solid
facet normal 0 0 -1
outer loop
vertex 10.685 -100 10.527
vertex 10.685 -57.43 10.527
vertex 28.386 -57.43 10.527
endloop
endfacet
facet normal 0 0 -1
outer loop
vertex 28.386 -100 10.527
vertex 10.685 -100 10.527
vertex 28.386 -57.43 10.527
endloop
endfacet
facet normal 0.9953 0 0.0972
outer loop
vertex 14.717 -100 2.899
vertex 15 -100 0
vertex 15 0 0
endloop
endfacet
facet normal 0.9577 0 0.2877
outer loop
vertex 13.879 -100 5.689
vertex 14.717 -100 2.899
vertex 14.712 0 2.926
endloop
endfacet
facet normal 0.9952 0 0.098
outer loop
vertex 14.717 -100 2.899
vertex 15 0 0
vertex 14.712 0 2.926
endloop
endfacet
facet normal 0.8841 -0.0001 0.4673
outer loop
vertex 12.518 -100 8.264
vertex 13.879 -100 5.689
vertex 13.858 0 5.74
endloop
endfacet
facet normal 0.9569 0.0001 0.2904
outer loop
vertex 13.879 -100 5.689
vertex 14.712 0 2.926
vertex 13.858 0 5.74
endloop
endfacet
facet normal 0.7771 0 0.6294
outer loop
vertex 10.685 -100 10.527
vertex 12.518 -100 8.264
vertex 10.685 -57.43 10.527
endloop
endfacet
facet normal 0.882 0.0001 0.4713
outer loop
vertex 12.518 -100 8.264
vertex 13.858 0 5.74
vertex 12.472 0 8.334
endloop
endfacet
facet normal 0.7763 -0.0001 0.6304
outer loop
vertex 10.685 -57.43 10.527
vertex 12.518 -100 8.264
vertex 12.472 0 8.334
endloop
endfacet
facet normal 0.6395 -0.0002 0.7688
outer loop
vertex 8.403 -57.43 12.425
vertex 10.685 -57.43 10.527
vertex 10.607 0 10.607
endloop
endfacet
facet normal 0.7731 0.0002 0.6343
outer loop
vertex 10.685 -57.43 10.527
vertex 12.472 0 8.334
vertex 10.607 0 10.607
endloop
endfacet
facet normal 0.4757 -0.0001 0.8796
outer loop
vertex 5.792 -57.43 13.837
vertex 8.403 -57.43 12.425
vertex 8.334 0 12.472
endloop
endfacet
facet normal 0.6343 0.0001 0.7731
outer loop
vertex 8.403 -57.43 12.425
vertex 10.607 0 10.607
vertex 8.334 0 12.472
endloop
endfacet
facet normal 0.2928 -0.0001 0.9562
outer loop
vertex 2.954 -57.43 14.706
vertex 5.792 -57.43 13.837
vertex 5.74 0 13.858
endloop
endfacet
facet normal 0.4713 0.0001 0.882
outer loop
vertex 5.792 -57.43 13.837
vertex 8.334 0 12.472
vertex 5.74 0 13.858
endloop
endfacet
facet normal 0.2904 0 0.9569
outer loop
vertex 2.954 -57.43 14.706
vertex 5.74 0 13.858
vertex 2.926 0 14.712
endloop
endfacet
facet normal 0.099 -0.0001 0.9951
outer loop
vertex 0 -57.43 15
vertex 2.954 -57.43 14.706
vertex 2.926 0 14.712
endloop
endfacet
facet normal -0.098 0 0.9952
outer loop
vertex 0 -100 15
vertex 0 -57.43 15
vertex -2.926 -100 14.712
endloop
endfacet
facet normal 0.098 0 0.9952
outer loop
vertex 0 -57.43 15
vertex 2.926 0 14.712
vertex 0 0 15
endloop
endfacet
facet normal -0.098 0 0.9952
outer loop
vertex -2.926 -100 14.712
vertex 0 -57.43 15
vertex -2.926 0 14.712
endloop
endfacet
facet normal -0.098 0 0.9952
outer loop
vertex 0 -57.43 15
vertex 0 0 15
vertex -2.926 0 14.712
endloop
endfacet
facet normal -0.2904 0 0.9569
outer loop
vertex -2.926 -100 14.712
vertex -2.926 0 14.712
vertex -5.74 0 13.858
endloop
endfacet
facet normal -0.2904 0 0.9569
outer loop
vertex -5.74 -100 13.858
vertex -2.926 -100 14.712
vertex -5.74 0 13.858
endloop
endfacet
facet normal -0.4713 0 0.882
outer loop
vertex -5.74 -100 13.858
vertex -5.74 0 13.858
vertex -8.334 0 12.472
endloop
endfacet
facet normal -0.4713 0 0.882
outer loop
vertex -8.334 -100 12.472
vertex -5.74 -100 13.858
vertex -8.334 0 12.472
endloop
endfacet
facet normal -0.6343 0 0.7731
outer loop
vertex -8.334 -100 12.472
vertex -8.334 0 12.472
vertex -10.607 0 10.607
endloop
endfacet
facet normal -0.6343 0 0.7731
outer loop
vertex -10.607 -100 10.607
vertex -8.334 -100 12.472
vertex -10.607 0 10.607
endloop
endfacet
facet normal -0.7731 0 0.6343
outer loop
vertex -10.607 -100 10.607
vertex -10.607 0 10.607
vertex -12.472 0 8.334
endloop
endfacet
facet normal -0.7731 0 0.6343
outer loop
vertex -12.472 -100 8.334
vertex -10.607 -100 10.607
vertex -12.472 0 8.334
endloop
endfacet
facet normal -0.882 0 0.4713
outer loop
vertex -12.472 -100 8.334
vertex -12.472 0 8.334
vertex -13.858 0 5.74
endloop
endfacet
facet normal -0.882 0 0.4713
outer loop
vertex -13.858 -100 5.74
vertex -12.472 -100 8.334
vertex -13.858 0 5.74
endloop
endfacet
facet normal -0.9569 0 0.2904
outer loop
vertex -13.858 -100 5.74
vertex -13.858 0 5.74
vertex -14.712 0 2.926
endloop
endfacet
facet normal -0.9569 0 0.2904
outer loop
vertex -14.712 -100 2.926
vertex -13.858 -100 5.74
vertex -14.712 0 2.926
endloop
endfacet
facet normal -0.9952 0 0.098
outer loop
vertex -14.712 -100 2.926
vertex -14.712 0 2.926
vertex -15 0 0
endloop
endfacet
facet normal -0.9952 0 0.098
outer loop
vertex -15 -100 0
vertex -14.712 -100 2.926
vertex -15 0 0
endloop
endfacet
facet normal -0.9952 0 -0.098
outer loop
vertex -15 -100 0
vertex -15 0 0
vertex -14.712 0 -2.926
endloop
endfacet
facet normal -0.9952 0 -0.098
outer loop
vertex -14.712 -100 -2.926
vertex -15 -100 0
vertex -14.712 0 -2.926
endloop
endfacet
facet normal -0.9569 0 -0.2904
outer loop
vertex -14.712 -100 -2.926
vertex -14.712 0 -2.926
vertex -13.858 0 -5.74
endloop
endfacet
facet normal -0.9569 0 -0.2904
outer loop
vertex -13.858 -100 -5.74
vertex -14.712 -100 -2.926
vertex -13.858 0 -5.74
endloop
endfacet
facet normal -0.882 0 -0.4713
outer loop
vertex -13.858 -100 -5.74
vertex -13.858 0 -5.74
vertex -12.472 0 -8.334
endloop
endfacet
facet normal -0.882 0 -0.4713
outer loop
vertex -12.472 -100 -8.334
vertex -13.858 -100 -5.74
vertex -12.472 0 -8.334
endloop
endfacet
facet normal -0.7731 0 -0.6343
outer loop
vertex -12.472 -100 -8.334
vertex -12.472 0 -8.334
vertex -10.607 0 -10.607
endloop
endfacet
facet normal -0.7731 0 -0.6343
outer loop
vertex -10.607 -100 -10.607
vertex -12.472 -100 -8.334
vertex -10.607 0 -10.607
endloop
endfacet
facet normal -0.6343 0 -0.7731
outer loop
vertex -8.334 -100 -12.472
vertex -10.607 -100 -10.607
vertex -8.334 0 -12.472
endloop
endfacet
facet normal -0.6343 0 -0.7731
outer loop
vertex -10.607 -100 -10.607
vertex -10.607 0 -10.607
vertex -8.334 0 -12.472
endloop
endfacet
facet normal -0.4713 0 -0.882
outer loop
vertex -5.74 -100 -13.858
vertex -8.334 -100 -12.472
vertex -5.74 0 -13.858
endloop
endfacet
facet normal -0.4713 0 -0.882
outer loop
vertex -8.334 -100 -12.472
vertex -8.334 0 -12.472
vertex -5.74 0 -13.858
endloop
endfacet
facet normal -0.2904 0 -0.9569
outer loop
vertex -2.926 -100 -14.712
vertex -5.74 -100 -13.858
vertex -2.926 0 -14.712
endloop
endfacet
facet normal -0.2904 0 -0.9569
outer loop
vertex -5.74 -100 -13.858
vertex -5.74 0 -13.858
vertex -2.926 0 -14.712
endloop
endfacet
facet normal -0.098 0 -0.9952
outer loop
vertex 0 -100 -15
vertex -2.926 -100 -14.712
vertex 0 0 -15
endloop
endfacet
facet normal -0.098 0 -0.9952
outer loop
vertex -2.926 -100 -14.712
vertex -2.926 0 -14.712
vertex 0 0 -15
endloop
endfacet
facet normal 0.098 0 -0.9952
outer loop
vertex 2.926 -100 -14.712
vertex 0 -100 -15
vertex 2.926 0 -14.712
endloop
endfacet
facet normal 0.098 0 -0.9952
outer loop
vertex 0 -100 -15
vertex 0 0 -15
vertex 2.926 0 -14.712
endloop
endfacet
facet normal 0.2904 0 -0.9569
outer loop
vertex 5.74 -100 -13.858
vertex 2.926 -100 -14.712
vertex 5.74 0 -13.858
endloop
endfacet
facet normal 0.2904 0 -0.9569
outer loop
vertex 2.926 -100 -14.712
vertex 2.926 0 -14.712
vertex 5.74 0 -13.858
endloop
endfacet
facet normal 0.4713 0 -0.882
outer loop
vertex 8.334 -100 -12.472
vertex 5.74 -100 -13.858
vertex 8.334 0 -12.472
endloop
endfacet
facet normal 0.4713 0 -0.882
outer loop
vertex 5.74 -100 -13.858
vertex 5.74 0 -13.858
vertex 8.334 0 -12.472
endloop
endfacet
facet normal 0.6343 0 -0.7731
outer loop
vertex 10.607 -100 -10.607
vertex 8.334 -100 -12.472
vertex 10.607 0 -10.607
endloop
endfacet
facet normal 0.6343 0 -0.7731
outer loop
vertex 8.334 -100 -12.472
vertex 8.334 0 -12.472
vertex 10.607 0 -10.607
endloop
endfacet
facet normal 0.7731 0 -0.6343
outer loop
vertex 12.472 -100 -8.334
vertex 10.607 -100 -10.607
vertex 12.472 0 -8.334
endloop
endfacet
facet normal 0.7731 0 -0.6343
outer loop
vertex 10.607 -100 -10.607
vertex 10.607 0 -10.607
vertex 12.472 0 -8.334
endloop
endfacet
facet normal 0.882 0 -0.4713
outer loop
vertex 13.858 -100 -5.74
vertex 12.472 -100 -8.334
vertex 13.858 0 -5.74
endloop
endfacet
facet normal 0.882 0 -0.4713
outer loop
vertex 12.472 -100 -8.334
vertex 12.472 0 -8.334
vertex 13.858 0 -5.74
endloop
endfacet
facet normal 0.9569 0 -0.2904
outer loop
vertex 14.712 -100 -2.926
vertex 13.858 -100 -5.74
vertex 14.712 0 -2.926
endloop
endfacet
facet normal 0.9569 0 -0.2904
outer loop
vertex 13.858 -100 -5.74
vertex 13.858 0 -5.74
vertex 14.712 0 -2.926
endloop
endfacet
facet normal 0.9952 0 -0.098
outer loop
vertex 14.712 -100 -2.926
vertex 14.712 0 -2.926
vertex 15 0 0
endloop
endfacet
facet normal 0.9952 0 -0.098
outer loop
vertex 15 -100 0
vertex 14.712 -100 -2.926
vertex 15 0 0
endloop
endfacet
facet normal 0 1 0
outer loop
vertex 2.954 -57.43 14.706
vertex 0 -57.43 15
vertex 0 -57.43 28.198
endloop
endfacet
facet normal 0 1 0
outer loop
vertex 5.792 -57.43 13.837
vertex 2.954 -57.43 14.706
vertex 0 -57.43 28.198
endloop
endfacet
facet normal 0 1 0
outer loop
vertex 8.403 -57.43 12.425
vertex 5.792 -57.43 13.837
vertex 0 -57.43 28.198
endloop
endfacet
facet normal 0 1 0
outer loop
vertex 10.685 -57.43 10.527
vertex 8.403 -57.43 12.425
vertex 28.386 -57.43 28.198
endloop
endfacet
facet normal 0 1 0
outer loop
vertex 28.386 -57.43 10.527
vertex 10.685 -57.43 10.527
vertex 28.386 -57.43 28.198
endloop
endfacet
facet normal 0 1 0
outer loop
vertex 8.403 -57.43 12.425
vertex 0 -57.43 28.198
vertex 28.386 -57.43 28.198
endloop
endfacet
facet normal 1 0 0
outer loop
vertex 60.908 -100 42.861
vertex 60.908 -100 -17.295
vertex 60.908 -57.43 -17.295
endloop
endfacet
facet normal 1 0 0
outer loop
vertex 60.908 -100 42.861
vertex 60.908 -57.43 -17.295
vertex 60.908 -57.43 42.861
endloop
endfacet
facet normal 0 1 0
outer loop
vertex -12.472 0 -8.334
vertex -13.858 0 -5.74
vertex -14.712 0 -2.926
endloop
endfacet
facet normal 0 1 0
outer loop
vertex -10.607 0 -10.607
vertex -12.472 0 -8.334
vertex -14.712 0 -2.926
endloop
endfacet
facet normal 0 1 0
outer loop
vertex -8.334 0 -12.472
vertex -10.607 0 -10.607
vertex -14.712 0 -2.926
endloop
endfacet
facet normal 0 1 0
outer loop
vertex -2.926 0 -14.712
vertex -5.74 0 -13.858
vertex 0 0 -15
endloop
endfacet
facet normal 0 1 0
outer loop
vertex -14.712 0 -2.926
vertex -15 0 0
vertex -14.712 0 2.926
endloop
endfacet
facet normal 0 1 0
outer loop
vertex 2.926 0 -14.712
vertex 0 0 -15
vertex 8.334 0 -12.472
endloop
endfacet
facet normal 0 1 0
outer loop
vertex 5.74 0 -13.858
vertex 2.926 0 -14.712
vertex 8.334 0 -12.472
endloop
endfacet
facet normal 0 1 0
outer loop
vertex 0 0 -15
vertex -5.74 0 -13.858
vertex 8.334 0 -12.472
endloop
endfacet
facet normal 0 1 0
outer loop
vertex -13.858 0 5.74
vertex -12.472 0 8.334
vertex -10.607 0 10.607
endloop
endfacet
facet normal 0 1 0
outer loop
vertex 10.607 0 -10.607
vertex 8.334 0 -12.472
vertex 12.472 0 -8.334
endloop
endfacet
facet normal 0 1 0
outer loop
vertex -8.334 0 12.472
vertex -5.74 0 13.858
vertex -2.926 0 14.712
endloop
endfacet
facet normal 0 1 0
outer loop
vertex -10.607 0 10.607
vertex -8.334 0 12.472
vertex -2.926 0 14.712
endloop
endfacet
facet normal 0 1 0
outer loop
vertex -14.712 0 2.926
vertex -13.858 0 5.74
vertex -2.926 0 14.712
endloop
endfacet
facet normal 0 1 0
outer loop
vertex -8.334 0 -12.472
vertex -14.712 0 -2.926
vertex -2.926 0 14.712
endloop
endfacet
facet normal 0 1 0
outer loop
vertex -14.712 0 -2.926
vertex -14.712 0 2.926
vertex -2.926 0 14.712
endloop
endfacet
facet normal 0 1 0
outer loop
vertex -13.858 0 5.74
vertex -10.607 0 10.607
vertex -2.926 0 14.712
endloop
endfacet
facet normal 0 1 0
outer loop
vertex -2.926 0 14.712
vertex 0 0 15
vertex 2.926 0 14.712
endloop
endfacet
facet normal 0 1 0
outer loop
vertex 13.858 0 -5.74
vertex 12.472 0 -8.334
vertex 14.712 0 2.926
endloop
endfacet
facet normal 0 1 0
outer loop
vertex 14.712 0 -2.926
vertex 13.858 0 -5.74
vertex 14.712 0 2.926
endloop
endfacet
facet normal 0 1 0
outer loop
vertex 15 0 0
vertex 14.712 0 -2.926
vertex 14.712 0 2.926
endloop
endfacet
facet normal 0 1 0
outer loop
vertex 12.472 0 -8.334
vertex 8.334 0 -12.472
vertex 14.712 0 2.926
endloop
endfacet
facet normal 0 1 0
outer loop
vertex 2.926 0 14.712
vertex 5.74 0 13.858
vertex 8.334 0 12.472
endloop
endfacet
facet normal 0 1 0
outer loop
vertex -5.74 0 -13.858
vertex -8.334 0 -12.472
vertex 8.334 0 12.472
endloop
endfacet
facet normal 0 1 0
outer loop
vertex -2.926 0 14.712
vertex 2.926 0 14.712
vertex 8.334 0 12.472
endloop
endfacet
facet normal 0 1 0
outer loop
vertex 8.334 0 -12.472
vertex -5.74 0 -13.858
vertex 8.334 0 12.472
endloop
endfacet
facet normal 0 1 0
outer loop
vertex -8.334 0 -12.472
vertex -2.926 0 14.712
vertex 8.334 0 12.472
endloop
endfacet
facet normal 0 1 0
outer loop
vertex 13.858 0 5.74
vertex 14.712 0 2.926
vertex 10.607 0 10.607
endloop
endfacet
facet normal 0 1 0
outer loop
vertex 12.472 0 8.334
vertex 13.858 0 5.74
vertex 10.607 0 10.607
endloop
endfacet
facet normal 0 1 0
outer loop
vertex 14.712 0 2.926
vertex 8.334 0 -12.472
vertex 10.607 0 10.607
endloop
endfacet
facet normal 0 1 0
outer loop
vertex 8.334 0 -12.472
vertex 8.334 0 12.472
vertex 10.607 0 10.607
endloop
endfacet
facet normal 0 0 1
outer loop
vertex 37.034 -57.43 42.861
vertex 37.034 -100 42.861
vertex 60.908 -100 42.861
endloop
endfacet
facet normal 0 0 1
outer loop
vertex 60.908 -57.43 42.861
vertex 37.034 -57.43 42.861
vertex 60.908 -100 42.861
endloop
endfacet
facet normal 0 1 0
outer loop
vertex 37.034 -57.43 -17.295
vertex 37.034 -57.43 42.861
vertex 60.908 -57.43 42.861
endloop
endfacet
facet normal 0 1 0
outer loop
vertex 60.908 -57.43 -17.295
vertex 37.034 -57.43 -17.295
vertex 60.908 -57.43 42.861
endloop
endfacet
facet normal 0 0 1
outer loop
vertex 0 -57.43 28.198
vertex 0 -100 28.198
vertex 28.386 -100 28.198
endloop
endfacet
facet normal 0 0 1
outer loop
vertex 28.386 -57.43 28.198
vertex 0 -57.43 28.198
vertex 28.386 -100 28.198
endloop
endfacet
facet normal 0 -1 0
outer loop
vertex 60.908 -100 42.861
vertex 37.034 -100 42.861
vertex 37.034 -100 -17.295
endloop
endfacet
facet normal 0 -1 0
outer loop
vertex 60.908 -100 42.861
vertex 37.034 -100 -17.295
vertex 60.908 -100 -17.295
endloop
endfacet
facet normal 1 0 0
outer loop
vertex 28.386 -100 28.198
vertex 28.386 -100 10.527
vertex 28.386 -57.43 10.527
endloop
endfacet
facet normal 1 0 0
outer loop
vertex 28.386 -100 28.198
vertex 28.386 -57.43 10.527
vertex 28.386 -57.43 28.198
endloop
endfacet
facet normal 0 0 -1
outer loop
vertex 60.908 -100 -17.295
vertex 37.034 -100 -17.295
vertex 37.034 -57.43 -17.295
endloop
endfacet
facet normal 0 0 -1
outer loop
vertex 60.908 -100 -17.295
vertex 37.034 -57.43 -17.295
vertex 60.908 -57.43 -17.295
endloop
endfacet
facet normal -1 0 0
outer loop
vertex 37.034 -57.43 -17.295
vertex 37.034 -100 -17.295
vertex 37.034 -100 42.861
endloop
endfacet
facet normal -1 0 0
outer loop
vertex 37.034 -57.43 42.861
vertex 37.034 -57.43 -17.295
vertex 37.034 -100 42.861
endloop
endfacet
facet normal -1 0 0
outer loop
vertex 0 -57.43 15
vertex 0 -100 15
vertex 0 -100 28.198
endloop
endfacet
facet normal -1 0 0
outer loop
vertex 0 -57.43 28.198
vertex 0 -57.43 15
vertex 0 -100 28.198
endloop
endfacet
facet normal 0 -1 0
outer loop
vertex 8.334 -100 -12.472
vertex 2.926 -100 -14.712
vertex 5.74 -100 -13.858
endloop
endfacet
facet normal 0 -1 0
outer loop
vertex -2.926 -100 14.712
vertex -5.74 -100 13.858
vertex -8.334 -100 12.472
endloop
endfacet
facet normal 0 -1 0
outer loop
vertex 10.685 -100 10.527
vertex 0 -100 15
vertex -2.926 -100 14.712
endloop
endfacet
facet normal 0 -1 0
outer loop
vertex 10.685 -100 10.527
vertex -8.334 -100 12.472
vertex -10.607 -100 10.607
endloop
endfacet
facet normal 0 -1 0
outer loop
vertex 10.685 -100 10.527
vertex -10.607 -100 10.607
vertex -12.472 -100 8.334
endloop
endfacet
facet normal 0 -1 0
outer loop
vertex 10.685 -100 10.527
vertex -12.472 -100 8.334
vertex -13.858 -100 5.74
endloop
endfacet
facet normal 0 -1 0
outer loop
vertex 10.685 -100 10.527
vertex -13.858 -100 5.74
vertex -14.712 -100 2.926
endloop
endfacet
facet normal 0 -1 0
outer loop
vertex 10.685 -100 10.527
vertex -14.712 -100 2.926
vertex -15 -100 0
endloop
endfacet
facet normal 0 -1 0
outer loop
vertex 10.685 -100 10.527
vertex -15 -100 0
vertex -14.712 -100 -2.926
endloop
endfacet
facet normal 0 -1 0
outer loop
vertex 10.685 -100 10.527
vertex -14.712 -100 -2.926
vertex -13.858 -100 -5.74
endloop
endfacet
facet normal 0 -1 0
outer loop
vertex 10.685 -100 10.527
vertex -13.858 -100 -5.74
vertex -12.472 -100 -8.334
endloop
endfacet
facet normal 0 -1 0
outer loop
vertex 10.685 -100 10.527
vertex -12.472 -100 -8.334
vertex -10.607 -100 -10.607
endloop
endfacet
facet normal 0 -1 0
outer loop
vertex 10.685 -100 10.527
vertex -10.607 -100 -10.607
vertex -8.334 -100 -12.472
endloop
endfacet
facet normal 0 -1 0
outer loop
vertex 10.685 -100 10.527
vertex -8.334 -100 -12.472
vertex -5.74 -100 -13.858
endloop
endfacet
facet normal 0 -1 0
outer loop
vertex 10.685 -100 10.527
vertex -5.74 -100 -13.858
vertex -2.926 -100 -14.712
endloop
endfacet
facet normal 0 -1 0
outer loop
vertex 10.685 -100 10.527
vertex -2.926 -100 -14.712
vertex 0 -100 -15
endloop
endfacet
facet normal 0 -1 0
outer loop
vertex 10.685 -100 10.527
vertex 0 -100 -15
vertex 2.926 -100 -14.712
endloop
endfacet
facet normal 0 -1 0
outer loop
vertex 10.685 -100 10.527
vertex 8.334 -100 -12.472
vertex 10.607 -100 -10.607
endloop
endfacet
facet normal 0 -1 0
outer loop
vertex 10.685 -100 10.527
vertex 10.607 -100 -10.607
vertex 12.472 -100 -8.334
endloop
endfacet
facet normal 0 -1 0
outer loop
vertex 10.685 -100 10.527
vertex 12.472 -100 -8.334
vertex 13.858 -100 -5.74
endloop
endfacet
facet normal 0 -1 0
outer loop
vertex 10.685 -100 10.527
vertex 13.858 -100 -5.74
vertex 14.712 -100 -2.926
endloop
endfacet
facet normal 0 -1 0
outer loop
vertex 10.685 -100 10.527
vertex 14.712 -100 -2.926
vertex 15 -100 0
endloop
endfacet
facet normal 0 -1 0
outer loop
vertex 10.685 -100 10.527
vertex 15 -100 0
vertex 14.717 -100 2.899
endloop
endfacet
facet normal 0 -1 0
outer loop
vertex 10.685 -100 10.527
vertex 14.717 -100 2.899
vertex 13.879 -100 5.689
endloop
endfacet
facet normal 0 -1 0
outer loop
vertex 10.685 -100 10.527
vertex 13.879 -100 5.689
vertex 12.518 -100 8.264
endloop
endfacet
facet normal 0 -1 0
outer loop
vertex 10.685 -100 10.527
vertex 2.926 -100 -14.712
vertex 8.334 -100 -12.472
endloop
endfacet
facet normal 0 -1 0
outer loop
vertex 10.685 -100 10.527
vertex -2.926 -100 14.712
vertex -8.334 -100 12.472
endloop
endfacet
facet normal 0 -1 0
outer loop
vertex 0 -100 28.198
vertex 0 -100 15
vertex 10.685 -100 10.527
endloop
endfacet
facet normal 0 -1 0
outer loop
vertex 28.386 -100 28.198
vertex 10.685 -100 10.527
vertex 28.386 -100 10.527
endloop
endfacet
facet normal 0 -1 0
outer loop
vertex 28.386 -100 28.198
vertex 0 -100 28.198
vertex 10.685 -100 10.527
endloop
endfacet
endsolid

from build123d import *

# Parameters (mm, degrees)
F0_R     = 15
F1_DEPTH = 100
F3_W     = 28.386235
F3_H     = 17.670899
F3_W_2   = 23.874506
F3_H_2   = 60.156256
F4_DEPTH = 42.56963


with BuildPart() as f1:
    # F0 (on Front) → F1 (new body)
    with BuildSketch(Plane.XZ):
        Circle(F0_R)
    extrude(amount=F1_DEPTH)

    # F3 (on face) → F4 (join)
    with BuildSketch(Plane.XZ.offset(100)):
        with Locations((14.193117, 19.362777)):
            Rectangle(F3_W, F3_H)
        with Locations((48.970945, 12.783185)):
            Rectangle(F3_W_2, F3_H_2)
    extrude(amount=-F4_DEPTH)


solid = f1.part
